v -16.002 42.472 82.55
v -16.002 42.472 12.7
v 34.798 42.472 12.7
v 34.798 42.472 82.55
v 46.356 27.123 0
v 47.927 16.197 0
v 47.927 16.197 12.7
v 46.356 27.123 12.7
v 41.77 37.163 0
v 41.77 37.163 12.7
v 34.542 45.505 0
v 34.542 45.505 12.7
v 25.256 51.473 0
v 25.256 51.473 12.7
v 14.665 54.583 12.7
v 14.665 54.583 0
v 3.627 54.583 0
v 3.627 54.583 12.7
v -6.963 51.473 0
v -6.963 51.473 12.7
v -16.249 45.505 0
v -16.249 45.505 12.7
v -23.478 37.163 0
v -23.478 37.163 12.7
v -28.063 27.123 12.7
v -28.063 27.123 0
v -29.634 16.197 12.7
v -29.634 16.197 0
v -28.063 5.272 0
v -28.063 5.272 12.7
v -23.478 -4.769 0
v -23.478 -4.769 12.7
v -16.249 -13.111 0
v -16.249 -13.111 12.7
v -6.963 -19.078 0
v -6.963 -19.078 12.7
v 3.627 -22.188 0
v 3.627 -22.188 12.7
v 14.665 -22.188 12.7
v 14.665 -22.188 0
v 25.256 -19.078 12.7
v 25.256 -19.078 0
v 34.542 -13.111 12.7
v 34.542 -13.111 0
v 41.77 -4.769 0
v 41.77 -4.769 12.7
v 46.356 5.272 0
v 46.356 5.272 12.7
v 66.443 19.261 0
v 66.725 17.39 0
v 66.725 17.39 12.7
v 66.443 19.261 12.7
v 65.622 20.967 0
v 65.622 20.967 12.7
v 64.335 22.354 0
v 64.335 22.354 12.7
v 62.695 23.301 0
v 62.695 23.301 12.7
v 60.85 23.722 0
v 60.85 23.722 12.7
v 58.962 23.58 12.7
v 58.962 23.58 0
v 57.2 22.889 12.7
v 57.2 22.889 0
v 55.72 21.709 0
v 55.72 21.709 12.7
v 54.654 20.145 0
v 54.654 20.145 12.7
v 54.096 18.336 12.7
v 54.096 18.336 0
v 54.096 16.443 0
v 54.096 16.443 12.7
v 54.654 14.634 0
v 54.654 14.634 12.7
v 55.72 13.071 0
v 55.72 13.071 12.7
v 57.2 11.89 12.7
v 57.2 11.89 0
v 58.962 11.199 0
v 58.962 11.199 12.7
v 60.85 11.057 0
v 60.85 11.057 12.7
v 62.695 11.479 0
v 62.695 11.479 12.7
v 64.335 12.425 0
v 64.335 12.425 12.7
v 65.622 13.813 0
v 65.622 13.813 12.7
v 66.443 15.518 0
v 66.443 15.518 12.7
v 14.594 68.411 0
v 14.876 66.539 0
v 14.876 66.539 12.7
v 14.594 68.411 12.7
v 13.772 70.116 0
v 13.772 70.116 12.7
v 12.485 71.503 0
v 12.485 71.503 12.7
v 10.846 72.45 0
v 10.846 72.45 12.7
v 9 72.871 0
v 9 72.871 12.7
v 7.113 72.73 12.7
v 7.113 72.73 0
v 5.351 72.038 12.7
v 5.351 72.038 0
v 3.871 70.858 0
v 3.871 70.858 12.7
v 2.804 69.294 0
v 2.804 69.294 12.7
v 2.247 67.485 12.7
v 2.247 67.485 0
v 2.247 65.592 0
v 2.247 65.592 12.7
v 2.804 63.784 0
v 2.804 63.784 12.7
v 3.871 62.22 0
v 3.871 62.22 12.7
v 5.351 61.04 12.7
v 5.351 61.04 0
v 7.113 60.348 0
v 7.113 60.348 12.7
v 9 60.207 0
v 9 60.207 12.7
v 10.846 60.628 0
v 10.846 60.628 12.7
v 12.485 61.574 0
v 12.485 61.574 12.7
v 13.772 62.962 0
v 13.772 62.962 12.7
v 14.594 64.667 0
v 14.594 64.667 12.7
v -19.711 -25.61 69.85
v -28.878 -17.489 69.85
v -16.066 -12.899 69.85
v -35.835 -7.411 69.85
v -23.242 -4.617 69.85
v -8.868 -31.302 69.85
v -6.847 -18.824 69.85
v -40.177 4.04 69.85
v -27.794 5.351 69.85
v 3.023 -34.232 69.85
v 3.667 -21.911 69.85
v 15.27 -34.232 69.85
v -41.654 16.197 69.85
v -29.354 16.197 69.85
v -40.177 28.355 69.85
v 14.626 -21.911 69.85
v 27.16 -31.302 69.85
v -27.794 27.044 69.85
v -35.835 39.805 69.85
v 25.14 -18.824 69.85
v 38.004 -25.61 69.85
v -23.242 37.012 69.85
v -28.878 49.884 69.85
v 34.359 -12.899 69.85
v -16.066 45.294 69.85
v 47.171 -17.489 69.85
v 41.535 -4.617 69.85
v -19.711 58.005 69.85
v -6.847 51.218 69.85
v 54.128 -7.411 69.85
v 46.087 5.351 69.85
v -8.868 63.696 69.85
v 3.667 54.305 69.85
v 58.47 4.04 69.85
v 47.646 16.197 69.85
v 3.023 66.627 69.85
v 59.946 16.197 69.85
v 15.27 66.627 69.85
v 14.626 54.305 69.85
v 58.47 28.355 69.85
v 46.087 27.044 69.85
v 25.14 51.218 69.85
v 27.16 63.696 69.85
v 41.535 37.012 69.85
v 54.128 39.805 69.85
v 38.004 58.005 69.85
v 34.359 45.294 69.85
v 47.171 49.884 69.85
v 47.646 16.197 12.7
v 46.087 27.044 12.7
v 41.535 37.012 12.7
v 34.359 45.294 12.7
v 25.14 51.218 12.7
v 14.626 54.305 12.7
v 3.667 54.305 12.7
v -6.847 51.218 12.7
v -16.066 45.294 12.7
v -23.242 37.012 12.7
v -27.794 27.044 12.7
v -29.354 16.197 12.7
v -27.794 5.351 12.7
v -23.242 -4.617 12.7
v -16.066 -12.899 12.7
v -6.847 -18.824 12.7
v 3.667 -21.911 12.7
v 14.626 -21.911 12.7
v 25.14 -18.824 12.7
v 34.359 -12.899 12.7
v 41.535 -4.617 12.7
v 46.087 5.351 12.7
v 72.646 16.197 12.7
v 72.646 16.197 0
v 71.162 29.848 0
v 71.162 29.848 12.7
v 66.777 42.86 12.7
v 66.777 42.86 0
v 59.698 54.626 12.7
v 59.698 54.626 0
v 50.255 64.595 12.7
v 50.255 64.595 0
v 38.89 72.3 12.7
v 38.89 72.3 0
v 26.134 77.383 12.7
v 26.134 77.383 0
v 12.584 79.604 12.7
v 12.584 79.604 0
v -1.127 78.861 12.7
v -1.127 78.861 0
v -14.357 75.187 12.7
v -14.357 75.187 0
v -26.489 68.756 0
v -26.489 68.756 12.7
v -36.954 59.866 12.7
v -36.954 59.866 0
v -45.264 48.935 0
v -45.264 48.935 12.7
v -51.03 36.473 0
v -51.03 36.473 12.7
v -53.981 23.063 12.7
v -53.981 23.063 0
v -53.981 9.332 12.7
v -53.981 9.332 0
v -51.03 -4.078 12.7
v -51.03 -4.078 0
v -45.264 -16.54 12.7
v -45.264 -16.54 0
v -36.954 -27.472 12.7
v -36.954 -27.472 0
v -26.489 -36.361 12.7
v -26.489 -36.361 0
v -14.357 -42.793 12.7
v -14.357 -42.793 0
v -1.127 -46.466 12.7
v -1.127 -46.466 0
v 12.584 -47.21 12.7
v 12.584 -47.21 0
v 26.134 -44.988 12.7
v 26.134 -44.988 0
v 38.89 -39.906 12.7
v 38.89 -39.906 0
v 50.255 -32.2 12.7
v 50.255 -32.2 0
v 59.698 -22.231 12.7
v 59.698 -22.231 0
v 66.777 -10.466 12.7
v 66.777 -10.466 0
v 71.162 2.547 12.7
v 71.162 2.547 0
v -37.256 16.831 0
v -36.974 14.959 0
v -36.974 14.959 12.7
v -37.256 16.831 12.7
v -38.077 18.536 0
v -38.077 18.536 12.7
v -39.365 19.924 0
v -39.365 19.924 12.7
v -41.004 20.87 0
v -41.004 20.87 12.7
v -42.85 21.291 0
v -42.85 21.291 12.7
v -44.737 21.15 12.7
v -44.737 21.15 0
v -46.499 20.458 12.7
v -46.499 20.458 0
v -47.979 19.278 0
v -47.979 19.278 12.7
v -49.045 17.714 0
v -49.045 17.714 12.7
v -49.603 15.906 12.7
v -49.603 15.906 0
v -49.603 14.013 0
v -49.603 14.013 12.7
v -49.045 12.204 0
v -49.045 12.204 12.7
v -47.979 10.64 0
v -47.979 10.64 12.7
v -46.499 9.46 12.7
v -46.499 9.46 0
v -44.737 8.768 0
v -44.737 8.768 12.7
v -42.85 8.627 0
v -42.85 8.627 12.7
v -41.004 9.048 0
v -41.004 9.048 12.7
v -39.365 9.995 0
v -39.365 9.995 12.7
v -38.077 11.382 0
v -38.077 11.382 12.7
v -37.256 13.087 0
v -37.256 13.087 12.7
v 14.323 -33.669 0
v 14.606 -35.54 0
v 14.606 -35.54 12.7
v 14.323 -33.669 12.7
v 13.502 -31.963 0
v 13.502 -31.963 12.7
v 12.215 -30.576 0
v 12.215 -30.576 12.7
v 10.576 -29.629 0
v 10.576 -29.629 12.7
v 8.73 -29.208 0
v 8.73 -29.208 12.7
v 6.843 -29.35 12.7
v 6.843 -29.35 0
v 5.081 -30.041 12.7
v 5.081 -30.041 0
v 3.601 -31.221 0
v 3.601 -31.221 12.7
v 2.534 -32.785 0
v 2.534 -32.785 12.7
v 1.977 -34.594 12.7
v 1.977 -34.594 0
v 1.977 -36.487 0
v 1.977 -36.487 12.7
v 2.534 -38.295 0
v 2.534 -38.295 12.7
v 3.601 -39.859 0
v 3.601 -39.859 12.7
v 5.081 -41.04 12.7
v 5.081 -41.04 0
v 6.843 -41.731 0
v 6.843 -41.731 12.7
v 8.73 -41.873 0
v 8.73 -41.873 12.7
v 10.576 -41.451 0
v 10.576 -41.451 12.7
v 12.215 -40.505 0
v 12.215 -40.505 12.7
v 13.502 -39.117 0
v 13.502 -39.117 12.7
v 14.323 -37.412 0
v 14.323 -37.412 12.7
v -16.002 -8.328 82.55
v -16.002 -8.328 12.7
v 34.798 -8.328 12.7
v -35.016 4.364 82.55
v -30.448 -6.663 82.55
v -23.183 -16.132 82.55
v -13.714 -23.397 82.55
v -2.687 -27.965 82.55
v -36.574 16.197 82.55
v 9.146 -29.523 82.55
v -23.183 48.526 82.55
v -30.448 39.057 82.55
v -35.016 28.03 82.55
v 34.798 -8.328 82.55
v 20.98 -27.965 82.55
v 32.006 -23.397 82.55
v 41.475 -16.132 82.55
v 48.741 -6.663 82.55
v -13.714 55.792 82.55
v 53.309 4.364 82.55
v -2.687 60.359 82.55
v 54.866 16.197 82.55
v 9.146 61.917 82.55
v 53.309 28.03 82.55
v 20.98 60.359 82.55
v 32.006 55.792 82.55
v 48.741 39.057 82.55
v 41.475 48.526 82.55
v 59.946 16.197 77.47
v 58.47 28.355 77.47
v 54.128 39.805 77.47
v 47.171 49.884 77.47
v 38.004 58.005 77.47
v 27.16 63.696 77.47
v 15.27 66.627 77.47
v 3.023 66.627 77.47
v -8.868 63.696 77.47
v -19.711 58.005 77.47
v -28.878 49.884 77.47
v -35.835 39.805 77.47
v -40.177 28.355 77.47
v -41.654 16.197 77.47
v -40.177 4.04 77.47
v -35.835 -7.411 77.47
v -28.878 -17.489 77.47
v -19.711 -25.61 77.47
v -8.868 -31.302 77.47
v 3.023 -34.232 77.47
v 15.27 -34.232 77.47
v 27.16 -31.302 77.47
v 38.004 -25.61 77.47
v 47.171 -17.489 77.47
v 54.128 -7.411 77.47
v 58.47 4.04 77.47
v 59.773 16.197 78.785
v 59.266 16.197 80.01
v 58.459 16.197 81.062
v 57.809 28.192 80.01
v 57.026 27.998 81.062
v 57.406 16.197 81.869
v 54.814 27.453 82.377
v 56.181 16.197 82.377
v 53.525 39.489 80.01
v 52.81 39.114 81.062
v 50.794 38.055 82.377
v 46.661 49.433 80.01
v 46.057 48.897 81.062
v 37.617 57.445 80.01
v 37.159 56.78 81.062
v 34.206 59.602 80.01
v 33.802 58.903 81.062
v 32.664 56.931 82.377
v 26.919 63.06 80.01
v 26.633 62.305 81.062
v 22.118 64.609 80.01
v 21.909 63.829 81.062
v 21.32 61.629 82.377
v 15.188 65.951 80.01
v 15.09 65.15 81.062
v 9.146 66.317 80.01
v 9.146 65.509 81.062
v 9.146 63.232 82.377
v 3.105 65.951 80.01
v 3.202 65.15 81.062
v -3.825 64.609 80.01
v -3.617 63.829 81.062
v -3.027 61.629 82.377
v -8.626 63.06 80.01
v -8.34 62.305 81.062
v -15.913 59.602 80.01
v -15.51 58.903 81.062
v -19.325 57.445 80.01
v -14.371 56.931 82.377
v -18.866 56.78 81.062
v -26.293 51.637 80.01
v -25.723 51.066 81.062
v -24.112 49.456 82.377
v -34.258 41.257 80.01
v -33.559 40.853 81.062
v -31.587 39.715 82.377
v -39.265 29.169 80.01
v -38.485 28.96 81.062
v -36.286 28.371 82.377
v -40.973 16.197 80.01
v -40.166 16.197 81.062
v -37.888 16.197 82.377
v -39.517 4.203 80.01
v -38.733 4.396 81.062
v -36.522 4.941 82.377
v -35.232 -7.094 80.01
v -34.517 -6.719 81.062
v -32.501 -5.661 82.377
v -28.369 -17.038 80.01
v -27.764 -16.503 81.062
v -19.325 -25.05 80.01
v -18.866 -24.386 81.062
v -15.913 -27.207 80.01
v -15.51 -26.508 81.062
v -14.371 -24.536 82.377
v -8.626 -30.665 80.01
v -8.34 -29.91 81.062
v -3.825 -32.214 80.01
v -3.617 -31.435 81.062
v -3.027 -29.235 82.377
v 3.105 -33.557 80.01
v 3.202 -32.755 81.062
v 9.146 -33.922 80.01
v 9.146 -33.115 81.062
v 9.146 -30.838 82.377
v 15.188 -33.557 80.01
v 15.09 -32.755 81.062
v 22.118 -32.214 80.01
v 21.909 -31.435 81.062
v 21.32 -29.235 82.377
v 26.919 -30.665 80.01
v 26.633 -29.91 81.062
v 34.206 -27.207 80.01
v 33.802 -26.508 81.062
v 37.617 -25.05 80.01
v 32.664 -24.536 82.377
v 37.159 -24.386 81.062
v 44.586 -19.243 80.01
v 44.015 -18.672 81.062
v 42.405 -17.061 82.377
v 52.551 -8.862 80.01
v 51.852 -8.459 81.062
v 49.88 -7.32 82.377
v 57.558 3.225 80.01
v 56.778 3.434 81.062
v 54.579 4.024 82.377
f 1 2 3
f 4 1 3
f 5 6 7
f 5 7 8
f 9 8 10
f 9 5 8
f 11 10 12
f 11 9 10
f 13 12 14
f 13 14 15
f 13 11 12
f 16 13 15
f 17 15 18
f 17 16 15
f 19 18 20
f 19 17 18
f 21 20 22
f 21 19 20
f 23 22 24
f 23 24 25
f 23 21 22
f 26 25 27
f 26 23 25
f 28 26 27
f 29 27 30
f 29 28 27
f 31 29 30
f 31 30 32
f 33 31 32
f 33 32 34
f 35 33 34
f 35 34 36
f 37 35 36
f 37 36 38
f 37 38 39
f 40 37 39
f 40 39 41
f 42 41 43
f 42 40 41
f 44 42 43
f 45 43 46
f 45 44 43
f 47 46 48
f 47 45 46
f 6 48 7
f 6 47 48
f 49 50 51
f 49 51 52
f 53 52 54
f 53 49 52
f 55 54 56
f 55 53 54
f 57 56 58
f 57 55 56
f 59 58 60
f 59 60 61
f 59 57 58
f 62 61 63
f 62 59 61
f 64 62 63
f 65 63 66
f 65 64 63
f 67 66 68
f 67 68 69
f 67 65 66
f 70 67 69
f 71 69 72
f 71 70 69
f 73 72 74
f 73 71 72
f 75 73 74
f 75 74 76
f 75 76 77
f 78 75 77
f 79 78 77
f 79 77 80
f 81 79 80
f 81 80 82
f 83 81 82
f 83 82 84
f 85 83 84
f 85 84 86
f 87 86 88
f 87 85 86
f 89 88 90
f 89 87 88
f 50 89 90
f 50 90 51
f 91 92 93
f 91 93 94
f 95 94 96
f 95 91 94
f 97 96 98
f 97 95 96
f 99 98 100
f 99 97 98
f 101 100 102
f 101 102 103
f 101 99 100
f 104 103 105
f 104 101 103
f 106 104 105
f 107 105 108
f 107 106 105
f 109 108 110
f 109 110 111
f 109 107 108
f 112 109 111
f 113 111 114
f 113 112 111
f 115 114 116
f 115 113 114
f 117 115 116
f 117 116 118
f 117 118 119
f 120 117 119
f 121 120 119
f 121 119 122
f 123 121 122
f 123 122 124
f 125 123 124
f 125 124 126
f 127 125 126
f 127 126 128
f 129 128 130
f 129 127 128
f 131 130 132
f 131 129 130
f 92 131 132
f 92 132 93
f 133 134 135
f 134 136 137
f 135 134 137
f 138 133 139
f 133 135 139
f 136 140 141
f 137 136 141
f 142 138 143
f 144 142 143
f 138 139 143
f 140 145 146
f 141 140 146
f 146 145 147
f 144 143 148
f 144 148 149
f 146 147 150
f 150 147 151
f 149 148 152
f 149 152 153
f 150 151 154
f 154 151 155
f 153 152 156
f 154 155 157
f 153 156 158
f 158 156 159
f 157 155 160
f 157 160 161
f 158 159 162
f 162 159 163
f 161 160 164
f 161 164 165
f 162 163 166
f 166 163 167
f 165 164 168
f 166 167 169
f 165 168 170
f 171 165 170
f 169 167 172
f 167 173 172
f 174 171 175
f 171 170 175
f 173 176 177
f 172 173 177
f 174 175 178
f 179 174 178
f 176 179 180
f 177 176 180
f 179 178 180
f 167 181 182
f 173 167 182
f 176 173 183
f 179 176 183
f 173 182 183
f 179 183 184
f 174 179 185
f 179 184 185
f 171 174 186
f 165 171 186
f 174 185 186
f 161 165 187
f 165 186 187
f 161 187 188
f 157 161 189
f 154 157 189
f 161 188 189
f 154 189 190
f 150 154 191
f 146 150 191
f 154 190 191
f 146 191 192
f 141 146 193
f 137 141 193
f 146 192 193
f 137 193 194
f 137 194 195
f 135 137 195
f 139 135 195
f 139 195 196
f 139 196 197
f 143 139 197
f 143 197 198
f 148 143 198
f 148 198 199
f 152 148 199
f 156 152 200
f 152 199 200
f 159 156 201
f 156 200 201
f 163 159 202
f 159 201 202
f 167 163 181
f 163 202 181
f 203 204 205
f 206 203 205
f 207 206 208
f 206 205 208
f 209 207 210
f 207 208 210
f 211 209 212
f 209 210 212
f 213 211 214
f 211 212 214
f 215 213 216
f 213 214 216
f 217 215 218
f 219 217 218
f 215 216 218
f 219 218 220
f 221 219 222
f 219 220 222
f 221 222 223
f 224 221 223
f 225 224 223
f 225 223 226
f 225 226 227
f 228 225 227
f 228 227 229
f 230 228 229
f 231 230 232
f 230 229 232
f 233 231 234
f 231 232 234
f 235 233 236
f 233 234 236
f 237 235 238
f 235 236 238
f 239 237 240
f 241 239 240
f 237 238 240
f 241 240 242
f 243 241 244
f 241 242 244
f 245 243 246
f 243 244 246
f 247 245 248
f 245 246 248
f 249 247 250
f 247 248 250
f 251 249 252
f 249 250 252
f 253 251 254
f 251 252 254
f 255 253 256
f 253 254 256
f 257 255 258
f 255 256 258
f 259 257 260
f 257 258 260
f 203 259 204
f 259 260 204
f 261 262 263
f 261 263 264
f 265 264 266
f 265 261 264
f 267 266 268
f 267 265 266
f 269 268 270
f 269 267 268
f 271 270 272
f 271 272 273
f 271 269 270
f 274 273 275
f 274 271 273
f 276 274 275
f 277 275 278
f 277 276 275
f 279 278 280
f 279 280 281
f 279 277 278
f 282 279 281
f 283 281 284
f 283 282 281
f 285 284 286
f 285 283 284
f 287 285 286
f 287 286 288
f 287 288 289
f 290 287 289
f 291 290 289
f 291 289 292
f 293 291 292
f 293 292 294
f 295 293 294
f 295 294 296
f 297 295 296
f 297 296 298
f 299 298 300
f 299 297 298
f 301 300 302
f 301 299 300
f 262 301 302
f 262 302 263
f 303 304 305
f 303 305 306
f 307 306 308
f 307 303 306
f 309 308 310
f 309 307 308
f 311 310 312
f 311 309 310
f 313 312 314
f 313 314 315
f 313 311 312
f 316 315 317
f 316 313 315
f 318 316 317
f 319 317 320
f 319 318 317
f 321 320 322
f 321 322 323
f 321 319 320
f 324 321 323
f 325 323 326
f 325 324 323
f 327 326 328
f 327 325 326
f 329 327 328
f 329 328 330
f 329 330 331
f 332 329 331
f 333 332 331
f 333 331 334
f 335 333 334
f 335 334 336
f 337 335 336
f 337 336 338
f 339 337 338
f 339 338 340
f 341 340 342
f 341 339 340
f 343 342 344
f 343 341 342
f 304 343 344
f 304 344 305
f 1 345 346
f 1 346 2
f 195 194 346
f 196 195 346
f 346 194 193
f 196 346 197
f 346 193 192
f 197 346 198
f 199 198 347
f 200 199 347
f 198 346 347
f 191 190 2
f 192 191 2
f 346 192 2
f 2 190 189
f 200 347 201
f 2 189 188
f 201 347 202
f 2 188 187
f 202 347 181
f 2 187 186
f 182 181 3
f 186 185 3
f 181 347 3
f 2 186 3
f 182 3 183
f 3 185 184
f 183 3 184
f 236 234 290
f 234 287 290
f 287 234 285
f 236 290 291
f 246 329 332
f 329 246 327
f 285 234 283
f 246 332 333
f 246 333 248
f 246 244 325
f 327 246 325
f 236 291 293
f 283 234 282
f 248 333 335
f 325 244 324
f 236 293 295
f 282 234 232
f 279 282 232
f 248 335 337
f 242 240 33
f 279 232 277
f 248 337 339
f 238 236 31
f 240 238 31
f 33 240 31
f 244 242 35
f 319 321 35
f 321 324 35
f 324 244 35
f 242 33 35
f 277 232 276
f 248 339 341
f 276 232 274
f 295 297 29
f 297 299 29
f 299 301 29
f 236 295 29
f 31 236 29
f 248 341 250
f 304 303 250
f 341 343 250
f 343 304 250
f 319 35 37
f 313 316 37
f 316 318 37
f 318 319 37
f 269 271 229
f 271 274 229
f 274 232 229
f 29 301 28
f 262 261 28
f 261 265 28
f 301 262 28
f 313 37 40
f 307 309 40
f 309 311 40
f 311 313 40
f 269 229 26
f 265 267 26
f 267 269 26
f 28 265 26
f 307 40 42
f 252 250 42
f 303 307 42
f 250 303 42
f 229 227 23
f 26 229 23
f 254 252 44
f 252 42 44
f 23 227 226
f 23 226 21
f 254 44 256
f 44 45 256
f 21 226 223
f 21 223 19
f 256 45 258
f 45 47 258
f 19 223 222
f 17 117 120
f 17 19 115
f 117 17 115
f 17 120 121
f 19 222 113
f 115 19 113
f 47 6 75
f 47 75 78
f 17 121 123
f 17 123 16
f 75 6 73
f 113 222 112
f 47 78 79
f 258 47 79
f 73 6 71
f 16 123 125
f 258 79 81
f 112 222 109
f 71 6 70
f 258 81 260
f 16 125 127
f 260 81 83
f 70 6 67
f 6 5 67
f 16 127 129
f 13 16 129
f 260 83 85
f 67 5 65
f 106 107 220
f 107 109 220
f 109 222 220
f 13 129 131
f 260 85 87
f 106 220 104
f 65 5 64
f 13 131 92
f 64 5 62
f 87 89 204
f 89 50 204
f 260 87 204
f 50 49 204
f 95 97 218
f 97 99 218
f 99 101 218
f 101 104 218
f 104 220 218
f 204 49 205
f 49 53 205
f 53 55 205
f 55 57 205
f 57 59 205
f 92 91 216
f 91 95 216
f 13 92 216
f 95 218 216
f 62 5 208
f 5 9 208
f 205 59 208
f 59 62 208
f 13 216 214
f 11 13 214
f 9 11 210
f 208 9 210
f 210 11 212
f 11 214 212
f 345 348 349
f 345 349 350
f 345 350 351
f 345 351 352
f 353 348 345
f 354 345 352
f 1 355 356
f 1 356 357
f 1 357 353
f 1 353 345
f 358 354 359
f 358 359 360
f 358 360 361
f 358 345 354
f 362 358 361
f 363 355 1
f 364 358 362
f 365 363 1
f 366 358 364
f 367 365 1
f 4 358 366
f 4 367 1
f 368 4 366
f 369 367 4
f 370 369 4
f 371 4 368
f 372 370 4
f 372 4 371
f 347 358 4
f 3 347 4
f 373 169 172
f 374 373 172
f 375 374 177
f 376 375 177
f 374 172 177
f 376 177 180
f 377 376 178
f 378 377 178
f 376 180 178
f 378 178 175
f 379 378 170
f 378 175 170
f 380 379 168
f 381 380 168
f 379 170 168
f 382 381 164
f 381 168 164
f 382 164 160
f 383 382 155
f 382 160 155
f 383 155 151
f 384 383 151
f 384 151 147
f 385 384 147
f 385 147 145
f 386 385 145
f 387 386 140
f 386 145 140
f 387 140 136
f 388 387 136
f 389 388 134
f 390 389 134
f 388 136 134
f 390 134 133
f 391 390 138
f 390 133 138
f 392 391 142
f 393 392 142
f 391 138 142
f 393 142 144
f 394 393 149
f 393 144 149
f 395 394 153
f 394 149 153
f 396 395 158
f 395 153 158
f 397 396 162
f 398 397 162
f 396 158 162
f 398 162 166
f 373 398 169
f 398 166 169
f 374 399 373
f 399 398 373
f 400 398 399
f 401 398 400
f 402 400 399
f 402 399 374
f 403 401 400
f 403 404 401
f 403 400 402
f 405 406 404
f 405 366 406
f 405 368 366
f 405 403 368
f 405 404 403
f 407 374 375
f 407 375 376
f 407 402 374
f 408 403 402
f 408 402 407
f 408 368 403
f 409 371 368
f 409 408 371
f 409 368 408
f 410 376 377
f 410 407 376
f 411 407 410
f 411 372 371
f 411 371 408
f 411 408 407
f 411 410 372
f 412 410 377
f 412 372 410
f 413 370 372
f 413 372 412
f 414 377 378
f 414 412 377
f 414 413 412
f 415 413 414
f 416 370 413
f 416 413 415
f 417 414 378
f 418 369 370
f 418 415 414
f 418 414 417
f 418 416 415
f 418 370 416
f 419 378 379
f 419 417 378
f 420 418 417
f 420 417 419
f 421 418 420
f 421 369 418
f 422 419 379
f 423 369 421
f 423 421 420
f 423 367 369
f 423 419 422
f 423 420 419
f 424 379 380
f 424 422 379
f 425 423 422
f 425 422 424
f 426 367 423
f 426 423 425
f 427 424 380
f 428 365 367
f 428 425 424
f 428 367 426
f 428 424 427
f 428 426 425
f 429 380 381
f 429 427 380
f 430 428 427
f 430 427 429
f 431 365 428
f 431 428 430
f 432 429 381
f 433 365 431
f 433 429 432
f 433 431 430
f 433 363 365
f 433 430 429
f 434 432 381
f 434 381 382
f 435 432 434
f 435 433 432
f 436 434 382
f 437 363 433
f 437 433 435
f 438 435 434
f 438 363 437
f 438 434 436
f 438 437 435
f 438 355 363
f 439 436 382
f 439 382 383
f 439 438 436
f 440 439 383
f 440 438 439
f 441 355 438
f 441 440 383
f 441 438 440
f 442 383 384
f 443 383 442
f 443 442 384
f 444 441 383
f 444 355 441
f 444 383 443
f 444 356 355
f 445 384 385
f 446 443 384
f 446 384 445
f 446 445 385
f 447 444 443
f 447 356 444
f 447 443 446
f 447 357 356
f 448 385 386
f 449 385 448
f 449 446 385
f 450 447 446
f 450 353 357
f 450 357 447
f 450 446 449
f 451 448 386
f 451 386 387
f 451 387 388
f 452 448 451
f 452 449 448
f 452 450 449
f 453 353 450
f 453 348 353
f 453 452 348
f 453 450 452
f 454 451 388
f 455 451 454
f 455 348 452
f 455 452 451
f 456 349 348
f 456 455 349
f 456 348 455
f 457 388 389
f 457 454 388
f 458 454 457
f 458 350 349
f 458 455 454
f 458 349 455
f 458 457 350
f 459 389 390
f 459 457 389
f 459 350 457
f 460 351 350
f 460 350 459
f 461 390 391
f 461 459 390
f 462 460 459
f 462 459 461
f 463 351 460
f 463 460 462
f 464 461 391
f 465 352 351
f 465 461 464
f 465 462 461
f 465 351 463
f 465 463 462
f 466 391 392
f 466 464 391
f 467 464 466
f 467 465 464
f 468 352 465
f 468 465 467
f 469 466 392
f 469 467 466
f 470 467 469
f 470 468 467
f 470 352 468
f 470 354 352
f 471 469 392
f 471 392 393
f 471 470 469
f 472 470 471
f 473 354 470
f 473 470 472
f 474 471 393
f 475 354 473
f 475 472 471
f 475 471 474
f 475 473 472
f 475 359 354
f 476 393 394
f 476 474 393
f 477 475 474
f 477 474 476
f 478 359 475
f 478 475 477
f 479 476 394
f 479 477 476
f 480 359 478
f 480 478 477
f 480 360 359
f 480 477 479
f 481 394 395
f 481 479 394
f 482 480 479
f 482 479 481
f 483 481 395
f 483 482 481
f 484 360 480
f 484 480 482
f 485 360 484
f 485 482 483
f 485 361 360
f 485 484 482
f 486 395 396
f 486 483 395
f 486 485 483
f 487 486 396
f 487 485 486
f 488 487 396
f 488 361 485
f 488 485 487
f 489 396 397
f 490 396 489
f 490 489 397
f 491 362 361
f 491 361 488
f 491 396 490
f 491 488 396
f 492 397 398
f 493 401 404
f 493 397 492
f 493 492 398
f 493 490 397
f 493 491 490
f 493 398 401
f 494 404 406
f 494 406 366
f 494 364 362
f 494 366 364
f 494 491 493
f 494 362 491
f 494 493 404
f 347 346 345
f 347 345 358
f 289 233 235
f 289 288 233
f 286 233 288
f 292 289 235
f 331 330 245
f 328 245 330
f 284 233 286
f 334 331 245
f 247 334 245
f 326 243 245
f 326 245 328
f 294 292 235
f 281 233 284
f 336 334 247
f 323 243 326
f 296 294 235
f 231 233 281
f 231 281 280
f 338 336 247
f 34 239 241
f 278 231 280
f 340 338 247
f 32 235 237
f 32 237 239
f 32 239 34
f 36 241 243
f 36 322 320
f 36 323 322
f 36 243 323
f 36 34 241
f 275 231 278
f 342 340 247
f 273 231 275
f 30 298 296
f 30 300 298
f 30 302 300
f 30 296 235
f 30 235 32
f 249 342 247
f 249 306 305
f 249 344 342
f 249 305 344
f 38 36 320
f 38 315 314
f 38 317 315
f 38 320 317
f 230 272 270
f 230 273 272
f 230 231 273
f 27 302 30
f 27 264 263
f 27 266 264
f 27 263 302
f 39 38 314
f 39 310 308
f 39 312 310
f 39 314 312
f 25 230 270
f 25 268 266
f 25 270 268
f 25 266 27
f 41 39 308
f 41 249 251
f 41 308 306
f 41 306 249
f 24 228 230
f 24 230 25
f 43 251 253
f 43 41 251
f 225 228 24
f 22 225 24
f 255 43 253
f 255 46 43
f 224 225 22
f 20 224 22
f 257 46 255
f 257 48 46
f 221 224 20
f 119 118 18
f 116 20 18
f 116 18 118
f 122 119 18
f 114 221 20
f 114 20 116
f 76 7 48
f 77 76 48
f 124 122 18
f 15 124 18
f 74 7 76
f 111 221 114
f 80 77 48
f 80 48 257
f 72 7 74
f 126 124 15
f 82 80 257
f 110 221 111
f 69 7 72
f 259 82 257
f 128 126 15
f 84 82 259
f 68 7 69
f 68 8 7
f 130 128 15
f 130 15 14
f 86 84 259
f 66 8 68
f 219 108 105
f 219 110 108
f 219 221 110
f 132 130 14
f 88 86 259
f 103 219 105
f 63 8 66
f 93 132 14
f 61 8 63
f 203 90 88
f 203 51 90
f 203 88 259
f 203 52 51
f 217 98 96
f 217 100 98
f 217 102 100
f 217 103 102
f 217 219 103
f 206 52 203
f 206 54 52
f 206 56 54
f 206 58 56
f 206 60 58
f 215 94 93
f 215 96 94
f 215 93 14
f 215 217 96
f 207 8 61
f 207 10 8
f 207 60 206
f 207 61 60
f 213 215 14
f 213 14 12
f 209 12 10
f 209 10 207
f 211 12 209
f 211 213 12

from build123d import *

# Parameters (mm, degrees)
F0_R     = 63.5
F0_R_2   = 6.35
F0_R_3   = 38.780217
F1_DEPTH = 12.7
F2_R     = 38.499956
F3_DEPTH = 57.15
F4_R     = 50.8
F4_R_2   = 38.499956
F5_DEPTH = 12.7
F6_W     = 50.8
F6_H     = 50.8
F7_DEPTH = 110.998
F8_R     = 5.08


with BuildPart() as f1:
    # F0 (on Top) → F1 (new body)
    with BuildSketch(Plane.XY):
        with Locations((9.146401, 16.197268)):
            Circle(F0_R)
        with Locations((8.255593, -35.540316)):
            Circle(F0_R_2, mode=Mode.SUBTRACT)
        with Locations((-43.324083, 14.959157)):
            Circle(F0_R_2, mode=Mode.SUBTRACT)
        with Locations((8.525645, 66.538833)):
            Circle(F0_R_2, mode=Mode.SUBTRACT)
        with Locations((9.146401, 16.197268)):
            Circle(F0_R_3, mode=Mode.SUBTRACT)
        with Locations((60.37537, 17.389616)):
            Circle(F0_R_2, mode=Mode.SUBTRACT)
    extrude(amount=F1_DEPTH)


with BuildPart() as f3:
    # F2 (on face) → F3 (new body)
    with BuildSketch(Plane.XY.offset(12.7)):
        with Locations((9.146401, 16.197268)):
            Circle(F2_R)
    extrude(amount=F3_DEPTH)

    # F4 (on face) → F5 (join)
    with BuildSketch(Plane.XY.offset(69.85)):
        with Locations((9.146401, 16.197268)):
            Circle(F4_R)
        with Locations((9.146401, 16.197268)):
            Circle(F4_R_2, mode=Mode.SUBTRACT)
        with Locations((9.146401, 16.197268)):
            Circle(F4_R_2)
    extrude(amount=F5_DEPTH)

    # F6 (on face) → F7 (cut)
    with BuildSketch(Plane.XY.offset(82.55)):
        with Locations((9.397964, 17.072194)):
            Rectangle(F6_W, F6_H)
    extrude(amount=-F7_DEPTH, mode=Mode.SUBTRACT)

    # F8
    f8_edges = [f3.edges().sort_by_distance(p)[0] for p in [
        (-41.653599, 16.197268, 82.55),
    ]]
    fillet(f8_edges, radius=F8_R)


solid = Compound([f1.part, f3.part])
